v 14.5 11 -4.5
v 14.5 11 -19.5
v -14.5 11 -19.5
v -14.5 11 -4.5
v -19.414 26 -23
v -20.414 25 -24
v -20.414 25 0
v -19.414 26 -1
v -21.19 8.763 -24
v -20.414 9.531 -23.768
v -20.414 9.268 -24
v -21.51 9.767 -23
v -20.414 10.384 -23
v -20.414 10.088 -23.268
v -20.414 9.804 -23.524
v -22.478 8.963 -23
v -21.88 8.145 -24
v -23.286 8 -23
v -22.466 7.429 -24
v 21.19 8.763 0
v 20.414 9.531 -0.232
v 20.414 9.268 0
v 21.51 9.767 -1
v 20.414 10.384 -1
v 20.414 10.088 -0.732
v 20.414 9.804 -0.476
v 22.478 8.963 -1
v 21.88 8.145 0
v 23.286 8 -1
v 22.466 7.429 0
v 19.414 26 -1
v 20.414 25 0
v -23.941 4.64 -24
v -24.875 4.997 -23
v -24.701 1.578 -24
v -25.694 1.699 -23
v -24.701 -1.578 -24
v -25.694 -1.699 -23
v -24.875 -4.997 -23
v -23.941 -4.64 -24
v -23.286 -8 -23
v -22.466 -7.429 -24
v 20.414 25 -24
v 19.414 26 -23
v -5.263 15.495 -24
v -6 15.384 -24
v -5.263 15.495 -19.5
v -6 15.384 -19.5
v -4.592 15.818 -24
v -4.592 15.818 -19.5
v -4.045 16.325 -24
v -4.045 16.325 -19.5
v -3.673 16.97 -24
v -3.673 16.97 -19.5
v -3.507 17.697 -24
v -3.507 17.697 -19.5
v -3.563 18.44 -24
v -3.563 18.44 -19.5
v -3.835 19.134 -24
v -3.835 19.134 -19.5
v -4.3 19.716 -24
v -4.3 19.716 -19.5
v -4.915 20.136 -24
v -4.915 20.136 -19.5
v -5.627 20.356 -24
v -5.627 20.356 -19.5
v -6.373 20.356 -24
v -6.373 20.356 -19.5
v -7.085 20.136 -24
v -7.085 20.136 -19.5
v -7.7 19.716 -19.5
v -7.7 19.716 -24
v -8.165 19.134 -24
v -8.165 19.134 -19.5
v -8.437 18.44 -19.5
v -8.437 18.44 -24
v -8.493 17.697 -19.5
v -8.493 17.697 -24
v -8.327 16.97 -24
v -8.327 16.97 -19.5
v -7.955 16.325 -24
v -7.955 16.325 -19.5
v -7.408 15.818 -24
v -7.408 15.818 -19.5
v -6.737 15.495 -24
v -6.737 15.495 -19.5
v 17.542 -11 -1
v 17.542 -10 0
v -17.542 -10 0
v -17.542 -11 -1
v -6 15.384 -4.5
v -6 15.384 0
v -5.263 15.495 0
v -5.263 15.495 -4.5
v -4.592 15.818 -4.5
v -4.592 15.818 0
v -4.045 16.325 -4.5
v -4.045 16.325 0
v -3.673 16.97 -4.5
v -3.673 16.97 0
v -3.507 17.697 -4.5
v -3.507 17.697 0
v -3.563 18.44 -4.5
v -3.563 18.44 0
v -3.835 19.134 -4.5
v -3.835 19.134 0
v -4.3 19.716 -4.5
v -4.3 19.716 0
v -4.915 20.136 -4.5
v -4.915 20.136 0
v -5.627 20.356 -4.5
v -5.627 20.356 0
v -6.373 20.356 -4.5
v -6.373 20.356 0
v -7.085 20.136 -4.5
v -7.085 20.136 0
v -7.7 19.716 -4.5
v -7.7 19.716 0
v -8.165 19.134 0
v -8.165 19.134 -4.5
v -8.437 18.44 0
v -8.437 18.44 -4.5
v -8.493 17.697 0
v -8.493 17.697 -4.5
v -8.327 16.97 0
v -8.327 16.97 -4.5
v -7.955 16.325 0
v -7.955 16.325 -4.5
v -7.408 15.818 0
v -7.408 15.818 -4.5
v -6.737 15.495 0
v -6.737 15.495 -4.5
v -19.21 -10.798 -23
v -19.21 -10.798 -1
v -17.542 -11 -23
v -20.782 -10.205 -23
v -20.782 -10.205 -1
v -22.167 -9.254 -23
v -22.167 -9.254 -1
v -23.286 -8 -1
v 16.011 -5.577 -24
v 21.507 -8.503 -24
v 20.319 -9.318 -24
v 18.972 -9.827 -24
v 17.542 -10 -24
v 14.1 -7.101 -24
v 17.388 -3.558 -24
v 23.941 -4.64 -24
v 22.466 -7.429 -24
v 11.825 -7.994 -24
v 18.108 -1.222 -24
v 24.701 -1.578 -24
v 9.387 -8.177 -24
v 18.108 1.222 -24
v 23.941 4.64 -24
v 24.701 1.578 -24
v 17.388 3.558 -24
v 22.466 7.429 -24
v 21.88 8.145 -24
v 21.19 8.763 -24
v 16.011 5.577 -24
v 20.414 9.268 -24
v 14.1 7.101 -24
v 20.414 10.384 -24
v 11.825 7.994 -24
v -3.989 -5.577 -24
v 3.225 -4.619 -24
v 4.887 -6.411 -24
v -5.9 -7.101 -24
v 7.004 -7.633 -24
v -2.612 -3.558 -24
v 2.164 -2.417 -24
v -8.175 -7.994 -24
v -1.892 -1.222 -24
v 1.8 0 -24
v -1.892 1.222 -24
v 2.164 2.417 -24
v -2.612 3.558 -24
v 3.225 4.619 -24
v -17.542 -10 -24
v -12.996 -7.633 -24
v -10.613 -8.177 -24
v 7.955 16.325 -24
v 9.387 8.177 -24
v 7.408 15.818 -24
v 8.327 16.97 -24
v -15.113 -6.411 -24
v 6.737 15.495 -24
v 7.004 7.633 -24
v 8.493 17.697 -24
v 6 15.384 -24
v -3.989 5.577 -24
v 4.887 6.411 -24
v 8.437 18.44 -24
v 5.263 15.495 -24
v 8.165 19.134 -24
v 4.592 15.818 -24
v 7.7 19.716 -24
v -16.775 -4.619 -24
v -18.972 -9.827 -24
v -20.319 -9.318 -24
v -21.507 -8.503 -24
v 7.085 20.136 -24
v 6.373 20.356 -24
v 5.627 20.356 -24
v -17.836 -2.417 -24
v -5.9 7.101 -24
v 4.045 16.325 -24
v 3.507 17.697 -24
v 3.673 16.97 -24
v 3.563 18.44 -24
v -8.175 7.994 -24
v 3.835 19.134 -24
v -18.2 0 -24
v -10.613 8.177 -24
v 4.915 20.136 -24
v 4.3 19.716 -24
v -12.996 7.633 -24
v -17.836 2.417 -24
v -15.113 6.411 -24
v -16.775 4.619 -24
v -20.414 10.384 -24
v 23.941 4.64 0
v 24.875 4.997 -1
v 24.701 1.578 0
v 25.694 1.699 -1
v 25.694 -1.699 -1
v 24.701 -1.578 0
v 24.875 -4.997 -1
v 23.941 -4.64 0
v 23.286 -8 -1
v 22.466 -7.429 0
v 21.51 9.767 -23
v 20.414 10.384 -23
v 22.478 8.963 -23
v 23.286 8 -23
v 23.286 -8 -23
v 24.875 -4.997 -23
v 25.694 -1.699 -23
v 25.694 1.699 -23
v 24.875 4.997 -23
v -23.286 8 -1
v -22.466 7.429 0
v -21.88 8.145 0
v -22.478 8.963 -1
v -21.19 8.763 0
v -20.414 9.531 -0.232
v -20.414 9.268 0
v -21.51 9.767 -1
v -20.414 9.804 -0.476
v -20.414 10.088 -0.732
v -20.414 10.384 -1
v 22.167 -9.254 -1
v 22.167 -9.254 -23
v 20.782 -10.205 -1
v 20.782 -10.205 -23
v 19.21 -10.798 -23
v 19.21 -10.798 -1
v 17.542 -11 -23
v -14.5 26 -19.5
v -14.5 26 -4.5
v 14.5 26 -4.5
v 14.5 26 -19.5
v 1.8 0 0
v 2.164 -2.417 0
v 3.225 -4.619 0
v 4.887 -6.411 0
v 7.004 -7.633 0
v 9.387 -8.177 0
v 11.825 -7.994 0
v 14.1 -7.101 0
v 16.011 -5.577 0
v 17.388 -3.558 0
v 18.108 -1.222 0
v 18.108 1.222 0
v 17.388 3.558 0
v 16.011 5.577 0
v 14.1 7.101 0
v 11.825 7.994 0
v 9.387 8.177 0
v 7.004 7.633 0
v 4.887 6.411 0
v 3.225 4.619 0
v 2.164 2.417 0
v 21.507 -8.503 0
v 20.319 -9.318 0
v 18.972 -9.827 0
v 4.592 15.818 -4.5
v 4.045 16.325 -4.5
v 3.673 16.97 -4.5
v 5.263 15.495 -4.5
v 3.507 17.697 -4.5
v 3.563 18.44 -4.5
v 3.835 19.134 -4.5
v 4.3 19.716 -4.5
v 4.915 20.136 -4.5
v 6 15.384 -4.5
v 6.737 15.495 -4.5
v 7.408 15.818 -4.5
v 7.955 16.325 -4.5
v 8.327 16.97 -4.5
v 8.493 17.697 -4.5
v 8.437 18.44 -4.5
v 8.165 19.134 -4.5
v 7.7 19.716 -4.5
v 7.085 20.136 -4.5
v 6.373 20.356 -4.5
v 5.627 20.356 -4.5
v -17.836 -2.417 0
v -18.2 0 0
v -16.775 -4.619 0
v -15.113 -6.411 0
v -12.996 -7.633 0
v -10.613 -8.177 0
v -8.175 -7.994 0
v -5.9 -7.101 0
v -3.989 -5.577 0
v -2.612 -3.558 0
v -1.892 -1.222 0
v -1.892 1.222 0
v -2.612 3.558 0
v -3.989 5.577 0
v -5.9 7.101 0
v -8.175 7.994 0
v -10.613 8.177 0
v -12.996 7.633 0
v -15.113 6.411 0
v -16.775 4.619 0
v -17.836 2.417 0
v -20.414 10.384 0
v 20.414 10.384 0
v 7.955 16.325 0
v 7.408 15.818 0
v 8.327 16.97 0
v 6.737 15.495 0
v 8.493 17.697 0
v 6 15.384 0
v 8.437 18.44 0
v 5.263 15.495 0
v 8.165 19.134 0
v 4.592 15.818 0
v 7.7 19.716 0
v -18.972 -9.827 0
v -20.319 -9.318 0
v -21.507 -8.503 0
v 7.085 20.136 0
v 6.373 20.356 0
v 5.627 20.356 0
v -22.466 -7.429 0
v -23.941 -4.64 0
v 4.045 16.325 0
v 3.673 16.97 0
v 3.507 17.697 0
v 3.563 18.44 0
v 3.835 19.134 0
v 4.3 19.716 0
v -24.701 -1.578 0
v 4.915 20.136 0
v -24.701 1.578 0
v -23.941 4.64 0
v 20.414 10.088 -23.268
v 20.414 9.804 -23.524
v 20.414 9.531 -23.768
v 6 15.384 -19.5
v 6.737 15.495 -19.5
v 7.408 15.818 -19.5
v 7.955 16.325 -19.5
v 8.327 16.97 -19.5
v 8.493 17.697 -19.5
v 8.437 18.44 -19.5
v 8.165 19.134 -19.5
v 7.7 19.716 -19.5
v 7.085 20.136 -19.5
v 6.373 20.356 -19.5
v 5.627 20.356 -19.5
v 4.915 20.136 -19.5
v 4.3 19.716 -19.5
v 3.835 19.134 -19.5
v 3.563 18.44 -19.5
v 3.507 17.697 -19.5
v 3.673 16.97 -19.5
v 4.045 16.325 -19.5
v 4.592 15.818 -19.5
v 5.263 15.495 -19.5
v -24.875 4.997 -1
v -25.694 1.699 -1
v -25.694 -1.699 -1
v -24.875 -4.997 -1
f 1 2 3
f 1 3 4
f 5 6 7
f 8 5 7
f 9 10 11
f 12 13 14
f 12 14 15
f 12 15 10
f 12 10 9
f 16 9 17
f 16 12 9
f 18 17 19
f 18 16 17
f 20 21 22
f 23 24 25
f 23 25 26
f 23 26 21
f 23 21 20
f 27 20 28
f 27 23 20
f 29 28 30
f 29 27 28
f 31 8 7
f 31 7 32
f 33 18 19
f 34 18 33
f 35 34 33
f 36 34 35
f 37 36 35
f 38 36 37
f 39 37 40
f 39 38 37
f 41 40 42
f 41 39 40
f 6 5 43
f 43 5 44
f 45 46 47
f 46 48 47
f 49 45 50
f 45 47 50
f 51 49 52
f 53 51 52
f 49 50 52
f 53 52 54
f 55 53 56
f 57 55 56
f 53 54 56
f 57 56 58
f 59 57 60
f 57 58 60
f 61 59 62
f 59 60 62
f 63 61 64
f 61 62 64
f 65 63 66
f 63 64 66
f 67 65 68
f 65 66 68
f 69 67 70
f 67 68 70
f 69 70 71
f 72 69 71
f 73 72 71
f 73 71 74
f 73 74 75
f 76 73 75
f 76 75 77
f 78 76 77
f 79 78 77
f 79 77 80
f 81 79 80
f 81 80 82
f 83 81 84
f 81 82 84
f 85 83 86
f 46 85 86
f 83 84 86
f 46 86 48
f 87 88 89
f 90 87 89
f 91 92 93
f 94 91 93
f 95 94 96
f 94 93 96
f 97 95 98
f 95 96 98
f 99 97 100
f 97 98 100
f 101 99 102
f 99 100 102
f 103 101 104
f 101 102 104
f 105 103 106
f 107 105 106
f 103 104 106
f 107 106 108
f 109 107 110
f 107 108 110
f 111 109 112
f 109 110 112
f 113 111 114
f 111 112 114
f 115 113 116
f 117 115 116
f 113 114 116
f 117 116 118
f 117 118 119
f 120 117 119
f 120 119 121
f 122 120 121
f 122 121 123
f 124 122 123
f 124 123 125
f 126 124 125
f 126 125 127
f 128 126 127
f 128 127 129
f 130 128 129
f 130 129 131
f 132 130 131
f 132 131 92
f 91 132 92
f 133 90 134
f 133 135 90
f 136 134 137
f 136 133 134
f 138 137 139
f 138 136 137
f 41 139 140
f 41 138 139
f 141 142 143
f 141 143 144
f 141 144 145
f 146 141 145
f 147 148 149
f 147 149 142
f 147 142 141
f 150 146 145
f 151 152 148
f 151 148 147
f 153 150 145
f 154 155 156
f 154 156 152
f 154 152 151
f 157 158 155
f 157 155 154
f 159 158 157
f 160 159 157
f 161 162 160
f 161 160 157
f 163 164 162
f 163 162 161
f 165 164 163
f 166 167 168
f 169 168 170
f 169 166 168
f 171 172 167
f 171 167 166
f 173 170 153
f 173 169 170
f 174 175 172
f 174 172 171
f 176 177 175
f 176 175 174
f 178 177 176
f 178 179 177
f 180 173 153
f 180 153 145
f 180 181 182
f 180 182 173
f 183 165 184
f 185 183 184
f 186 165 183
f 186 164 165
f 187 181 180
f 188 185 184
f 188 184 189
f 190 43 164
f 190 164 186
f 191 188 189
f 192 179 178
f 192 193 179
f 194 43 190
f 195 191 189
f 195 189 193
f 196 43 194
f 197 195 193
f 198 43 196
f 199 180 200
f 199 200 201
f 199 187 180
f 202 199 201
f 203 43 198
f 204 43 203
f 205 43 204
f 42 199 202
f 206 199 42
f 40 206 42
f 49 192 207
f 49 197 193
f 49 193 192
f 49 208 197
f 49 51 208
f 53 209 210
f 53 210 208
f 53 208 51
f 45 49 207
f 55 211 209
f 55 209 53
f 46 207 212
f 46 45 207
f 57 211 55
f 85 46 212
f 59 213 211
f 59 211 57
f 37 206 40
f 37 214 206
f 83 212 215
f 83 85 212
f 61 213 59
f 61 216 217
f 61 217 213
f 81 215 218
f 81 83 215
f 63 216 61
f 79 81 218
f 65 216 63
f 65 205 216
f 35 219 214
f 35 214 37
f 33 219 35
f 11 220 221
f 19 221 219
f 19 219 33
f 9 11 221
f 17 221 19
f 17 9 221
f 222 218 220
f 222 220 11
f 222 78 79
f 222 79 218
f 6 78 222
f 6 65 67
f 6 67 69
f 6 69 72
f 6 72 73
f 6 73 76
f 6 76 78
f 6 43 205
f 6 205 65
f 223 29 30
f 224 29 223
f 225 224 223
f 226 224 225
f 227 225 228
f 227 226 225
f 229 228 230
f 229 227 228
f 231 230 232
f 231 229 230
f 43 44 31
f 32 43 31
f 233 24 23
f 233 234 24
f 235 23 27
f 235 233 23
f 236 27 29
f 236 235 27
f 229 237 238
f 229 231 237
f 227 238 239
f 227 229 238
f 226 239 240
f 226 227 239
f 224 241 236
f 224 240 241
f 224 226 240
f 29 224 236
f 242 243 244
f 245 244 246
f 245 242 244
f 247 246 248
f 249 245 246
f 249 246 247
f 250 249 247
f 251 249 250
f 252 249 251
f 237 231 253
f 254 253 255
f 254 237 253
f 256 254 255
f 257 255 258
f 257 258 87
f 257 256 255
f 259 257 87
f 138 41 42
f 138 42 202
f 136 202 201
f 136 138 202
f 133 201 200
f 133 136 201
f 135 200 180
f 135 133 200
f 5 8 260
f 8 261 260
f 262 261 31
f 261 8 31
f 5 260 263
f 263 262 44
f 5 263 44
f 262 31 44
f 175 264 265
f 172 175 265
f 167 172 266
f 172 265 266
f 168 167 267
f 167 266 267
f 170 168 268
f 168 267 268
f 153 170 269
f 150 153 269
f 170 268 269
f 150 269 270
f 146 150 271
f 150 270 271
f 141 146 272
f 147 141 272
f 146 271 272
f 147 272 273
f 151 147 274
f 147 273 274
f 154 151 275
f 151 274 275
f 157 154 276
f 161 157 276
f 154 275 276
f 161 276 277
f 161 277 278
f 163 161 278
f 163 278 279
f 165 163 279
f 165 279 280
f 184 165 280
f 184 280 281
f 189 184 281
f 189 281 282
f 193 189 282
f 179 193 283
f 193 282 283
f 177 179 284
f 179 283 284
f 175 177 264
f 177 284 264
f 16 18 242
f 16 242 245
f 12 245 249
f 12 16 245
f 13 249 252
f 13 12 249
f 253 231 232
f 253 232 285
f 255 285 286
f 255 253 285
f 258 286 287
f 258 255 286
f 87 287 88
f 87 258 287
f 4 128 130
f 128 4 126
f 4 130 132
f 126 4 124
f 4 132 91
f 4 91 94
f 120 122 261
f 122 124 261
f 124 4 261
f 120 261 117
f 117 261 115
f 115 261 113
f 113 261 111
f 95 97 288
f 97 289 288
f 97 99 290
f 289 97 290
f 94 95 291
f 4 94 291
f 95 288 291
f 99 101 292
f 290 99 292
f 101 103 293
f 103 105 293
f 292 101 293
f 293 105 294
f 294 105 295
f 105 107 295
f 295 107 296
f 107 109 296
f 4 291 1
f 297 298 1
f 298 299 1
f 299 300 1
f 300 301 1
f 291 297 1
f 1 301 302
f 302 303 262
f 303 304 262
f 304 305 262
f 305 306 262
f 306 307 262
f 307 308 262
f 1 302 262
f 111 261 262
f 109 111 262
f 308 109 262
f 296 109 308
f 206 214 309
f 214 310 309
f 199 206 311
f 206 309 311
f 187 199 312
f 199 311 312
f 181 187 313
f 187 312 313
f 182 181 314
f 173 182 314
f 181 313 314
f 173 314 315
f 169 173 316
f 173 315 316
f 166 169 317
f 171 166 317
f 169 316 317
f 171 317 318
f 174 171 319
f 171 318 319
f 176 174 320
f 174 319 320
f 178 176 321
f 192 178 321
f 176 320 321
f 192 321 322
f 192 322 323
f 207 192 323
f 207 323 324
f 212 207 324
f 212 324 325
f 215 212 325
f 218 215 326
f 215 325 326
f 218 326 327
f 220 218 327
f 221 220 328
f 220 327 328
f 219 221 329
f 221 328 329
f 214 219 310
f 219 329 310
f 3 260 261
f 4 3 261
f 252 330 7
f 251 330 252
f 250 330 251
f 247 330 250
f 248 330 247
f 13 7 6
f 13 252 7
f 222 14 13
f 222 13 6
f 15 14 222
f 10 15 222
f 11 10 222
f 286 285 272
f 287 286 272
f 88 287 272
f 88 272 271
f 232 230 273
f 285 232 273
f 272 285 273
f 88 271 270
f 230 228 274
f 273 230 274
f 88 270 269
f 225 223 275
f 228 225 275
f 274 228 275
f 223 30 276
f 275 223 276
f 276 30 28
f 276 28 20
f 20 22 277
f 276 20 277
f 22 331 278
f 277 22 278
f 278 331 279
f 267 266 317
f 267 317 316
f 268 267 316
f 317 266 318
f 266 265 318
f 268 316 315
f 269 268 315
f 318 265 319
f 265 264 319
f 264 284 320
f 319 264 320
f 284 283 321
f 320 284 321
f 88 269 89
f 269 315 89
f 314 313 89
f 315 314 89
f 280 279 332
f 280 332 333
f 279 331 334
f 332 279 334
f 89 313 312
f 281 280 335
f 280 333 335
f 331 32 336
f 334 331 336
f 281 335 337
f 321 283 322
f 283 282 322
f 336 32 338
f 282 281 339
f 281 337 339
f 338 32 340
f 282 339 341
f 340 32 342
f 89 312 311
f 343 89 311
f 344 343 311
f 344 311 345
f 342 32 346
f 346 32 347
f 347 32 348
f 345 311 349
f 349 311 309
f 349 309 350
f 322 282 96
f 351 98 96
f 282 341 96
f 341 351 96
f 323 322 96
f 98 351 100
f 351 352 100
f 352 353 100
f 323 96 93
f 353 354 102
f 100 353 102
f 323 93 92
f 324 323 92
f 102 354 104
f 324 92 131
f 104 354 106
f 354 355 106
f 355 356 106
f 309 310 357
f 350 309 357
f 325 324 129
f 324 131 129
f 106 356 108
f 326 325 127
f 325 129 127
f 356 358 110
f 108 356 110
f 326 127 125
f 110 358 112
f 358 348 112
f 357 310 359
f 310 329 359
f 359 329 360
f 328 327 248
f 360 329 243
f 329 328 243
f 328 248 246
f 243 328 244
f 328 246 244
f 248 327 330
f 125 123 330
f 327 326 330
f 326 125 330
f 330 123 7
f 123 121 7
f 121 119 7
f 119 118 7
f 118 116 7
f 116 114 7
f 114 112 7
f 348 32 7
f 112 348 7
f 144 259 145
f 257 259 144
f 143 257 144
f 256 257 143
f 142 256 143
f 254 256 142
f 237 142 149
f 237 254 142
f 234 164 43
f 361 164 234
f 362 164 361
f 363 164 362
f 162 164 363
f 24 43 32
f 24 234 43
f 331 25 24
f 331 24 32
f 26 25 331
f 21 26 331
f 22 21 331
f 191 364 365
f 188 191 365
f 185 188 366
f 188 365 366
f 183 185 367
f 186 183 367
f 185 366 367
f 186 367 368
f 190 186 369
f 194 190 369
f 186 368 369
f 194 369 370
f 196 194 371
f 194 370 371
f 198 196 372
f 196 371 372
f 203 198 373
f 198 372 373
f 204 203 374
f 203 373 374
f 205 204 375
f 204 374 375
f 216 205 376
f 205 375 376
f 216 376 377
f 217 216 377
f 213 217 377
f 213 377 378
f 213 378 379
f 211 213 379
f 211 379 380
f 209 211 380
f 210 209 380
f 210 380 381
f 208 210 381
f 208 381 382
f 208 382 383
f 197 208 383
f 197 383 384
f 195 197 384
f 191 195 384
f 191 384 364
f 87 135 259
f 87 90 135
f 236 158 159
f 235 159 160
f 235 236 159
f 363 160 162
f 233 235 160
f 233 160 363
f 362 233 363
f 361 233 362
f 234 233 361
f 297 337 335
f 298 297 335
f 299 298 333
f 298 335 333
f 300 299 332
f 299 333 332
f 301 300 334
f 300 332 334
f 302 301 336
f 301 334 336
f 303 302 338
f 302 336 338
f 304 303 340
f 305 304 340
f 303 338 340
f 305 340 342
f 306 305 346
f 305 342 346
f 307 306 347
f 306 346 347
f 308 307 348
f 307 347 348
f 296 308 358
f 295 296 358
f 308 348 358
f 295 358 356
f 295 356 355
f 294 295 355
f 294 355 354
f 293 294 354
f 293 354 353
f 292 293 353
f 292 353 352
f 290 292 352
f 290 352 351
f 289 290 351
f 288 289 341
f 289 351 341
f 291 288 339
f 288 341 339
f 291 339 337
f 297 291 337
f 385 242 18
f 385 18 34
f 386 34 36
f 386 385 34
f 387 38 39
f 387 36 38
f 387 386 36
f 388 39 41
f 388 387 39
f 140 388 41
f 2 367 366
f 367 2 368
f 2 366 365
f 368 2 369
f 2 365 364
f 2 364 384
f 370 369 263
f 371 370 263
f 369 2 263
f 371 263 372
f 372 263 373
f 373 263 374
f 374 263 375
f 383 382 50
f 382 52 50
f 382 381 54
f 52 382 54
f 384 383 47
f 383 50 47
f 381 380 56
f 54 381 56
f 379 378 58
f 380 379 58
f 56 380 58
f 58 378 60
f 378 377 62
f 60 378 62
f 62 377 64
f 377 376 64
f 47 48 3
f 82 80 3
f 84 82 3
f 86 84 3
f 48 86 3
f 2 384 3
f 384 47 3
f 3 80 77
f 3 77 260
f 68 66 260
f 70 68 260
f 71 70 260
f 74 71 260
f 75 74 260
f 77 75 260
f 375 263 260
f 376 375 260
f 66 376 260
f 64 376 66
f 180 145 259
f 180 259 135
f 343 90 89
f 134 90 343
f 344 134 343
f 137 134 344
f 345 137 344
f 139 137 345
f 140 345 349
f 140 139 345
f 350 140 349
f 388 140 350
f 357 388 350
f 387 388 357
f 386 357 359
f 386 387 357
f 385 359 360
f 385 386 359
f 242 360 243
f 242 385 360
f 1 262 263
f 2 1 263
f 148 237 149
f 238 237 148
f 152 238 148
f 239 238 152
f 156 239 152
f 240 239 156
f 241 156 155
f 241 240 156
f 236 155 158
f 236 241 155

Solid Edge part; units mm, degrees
sketch "Sketch1" plane through (0, 0, 0) normal (0, 0, 1) x (1, 0, 0)
  arc A0 (20.4574, 11) -> (20.4574, -11) centre (11.7971, 0) cw
  line L0 (-20.4574, -11) -> (20.4574, -11)
  arc A1 (-20.4574, 11) -> (-20.4574, -11) centre (-11.7971, 0) ccw
  line L1 (-20.4574, 11) -> (20.4574, 11)
  dimension "D1" = 14
  dimension "D2" = 22
extrude "Ajout_matière_1" add sketch "Sketch1" against normal blind 24
sketch "Sketch2" plane through (0, 0, 0) normal (0, 0, 1) x (-1, 0, 0)
  circle A0 centre (10, 0) radius 8.2
  circle A1 centre (-10, 0) radius 8.2
  dimension "D1" = 16.4
  dimension "D2" = 20
  dimension "D3" = 10
  dimension "D4" = 16.4
extrude "Cutout1" cut sketch "Sketch2" against normal through all and the other way up to next
fillet "Congé_1" radius 7 4 edges at (20.4574, -11, -12) (20.4574, 11, -12) (-20.4574, 11, -12) (-20.4574, -11, -12)
sketch "Sketch3" plane through (0, 11, -10) normal (0, 1, 0) x (-1, 0, 0)
  line L0 (-20.4139, 10) -> (20.4139, 10)
  line L1 (20.4139, 10) -> (20.4139, -14)
  line L2 (20.4139, -14) -> (-20.4139, -14)
  line L3 (-20.4139, -14) -> (-20.4139, 10)
extrude "Ajout_matière_3" add sketch "Sketch3" along normal blind 15 and the other way up to next
hole "Perçage_3" at (6, 17.8836, 0) direction (0, 0, -1) diameter 5 end up to next
hole "Hole1" at (-6, 17.8836, 0) direction (0, 0, -1) diameter 5 end up to next
sketch "Sketch4" plane through (0, 26, -10) normal (0, 1, 0) x (-1, 0, 0)
  line L0 (-14.5, 5.5) -> (-14.5, -9.5)
  line L1 (-14.5, -9.5) -> (14.5, -9.5)
  line L2 (14.5, -9.5) -> (14.5, 5.5)
  line L3 (14.5, 5.5) -> (-14.5, 5.5)
  dimension "D1" = 15
  dimension "D2" = 29
extrude "Enlèvement_matière_3" cut sketch "Sketch4" against normal blind 15
chamfer "Chanfrein_3" distance 1 angle 45 18 edges at (25.7971, 0, 0) (20.782, -10.2048, 0) (0, -11, 0) (-20.782, -10.2048, 0) (-25.7971, 0, 0) (-22.0119, 9.3868, 0) (22.0119, 9.3868, 0) (0, 26, 0) (25.7971, 0, -24) (20.782, -10.2048, -24) (0, -11, -24) (-20.782, -10.2048, -24) (-25.7971, 0, -24) (-22.0119, 9.3868, -24) (22.0119, 9.3868, -24) (0, 26, -24) (-20.4139, 26, -12) (20.4139, 26, -12)
properties material "Plastique ABS, haute performance"
